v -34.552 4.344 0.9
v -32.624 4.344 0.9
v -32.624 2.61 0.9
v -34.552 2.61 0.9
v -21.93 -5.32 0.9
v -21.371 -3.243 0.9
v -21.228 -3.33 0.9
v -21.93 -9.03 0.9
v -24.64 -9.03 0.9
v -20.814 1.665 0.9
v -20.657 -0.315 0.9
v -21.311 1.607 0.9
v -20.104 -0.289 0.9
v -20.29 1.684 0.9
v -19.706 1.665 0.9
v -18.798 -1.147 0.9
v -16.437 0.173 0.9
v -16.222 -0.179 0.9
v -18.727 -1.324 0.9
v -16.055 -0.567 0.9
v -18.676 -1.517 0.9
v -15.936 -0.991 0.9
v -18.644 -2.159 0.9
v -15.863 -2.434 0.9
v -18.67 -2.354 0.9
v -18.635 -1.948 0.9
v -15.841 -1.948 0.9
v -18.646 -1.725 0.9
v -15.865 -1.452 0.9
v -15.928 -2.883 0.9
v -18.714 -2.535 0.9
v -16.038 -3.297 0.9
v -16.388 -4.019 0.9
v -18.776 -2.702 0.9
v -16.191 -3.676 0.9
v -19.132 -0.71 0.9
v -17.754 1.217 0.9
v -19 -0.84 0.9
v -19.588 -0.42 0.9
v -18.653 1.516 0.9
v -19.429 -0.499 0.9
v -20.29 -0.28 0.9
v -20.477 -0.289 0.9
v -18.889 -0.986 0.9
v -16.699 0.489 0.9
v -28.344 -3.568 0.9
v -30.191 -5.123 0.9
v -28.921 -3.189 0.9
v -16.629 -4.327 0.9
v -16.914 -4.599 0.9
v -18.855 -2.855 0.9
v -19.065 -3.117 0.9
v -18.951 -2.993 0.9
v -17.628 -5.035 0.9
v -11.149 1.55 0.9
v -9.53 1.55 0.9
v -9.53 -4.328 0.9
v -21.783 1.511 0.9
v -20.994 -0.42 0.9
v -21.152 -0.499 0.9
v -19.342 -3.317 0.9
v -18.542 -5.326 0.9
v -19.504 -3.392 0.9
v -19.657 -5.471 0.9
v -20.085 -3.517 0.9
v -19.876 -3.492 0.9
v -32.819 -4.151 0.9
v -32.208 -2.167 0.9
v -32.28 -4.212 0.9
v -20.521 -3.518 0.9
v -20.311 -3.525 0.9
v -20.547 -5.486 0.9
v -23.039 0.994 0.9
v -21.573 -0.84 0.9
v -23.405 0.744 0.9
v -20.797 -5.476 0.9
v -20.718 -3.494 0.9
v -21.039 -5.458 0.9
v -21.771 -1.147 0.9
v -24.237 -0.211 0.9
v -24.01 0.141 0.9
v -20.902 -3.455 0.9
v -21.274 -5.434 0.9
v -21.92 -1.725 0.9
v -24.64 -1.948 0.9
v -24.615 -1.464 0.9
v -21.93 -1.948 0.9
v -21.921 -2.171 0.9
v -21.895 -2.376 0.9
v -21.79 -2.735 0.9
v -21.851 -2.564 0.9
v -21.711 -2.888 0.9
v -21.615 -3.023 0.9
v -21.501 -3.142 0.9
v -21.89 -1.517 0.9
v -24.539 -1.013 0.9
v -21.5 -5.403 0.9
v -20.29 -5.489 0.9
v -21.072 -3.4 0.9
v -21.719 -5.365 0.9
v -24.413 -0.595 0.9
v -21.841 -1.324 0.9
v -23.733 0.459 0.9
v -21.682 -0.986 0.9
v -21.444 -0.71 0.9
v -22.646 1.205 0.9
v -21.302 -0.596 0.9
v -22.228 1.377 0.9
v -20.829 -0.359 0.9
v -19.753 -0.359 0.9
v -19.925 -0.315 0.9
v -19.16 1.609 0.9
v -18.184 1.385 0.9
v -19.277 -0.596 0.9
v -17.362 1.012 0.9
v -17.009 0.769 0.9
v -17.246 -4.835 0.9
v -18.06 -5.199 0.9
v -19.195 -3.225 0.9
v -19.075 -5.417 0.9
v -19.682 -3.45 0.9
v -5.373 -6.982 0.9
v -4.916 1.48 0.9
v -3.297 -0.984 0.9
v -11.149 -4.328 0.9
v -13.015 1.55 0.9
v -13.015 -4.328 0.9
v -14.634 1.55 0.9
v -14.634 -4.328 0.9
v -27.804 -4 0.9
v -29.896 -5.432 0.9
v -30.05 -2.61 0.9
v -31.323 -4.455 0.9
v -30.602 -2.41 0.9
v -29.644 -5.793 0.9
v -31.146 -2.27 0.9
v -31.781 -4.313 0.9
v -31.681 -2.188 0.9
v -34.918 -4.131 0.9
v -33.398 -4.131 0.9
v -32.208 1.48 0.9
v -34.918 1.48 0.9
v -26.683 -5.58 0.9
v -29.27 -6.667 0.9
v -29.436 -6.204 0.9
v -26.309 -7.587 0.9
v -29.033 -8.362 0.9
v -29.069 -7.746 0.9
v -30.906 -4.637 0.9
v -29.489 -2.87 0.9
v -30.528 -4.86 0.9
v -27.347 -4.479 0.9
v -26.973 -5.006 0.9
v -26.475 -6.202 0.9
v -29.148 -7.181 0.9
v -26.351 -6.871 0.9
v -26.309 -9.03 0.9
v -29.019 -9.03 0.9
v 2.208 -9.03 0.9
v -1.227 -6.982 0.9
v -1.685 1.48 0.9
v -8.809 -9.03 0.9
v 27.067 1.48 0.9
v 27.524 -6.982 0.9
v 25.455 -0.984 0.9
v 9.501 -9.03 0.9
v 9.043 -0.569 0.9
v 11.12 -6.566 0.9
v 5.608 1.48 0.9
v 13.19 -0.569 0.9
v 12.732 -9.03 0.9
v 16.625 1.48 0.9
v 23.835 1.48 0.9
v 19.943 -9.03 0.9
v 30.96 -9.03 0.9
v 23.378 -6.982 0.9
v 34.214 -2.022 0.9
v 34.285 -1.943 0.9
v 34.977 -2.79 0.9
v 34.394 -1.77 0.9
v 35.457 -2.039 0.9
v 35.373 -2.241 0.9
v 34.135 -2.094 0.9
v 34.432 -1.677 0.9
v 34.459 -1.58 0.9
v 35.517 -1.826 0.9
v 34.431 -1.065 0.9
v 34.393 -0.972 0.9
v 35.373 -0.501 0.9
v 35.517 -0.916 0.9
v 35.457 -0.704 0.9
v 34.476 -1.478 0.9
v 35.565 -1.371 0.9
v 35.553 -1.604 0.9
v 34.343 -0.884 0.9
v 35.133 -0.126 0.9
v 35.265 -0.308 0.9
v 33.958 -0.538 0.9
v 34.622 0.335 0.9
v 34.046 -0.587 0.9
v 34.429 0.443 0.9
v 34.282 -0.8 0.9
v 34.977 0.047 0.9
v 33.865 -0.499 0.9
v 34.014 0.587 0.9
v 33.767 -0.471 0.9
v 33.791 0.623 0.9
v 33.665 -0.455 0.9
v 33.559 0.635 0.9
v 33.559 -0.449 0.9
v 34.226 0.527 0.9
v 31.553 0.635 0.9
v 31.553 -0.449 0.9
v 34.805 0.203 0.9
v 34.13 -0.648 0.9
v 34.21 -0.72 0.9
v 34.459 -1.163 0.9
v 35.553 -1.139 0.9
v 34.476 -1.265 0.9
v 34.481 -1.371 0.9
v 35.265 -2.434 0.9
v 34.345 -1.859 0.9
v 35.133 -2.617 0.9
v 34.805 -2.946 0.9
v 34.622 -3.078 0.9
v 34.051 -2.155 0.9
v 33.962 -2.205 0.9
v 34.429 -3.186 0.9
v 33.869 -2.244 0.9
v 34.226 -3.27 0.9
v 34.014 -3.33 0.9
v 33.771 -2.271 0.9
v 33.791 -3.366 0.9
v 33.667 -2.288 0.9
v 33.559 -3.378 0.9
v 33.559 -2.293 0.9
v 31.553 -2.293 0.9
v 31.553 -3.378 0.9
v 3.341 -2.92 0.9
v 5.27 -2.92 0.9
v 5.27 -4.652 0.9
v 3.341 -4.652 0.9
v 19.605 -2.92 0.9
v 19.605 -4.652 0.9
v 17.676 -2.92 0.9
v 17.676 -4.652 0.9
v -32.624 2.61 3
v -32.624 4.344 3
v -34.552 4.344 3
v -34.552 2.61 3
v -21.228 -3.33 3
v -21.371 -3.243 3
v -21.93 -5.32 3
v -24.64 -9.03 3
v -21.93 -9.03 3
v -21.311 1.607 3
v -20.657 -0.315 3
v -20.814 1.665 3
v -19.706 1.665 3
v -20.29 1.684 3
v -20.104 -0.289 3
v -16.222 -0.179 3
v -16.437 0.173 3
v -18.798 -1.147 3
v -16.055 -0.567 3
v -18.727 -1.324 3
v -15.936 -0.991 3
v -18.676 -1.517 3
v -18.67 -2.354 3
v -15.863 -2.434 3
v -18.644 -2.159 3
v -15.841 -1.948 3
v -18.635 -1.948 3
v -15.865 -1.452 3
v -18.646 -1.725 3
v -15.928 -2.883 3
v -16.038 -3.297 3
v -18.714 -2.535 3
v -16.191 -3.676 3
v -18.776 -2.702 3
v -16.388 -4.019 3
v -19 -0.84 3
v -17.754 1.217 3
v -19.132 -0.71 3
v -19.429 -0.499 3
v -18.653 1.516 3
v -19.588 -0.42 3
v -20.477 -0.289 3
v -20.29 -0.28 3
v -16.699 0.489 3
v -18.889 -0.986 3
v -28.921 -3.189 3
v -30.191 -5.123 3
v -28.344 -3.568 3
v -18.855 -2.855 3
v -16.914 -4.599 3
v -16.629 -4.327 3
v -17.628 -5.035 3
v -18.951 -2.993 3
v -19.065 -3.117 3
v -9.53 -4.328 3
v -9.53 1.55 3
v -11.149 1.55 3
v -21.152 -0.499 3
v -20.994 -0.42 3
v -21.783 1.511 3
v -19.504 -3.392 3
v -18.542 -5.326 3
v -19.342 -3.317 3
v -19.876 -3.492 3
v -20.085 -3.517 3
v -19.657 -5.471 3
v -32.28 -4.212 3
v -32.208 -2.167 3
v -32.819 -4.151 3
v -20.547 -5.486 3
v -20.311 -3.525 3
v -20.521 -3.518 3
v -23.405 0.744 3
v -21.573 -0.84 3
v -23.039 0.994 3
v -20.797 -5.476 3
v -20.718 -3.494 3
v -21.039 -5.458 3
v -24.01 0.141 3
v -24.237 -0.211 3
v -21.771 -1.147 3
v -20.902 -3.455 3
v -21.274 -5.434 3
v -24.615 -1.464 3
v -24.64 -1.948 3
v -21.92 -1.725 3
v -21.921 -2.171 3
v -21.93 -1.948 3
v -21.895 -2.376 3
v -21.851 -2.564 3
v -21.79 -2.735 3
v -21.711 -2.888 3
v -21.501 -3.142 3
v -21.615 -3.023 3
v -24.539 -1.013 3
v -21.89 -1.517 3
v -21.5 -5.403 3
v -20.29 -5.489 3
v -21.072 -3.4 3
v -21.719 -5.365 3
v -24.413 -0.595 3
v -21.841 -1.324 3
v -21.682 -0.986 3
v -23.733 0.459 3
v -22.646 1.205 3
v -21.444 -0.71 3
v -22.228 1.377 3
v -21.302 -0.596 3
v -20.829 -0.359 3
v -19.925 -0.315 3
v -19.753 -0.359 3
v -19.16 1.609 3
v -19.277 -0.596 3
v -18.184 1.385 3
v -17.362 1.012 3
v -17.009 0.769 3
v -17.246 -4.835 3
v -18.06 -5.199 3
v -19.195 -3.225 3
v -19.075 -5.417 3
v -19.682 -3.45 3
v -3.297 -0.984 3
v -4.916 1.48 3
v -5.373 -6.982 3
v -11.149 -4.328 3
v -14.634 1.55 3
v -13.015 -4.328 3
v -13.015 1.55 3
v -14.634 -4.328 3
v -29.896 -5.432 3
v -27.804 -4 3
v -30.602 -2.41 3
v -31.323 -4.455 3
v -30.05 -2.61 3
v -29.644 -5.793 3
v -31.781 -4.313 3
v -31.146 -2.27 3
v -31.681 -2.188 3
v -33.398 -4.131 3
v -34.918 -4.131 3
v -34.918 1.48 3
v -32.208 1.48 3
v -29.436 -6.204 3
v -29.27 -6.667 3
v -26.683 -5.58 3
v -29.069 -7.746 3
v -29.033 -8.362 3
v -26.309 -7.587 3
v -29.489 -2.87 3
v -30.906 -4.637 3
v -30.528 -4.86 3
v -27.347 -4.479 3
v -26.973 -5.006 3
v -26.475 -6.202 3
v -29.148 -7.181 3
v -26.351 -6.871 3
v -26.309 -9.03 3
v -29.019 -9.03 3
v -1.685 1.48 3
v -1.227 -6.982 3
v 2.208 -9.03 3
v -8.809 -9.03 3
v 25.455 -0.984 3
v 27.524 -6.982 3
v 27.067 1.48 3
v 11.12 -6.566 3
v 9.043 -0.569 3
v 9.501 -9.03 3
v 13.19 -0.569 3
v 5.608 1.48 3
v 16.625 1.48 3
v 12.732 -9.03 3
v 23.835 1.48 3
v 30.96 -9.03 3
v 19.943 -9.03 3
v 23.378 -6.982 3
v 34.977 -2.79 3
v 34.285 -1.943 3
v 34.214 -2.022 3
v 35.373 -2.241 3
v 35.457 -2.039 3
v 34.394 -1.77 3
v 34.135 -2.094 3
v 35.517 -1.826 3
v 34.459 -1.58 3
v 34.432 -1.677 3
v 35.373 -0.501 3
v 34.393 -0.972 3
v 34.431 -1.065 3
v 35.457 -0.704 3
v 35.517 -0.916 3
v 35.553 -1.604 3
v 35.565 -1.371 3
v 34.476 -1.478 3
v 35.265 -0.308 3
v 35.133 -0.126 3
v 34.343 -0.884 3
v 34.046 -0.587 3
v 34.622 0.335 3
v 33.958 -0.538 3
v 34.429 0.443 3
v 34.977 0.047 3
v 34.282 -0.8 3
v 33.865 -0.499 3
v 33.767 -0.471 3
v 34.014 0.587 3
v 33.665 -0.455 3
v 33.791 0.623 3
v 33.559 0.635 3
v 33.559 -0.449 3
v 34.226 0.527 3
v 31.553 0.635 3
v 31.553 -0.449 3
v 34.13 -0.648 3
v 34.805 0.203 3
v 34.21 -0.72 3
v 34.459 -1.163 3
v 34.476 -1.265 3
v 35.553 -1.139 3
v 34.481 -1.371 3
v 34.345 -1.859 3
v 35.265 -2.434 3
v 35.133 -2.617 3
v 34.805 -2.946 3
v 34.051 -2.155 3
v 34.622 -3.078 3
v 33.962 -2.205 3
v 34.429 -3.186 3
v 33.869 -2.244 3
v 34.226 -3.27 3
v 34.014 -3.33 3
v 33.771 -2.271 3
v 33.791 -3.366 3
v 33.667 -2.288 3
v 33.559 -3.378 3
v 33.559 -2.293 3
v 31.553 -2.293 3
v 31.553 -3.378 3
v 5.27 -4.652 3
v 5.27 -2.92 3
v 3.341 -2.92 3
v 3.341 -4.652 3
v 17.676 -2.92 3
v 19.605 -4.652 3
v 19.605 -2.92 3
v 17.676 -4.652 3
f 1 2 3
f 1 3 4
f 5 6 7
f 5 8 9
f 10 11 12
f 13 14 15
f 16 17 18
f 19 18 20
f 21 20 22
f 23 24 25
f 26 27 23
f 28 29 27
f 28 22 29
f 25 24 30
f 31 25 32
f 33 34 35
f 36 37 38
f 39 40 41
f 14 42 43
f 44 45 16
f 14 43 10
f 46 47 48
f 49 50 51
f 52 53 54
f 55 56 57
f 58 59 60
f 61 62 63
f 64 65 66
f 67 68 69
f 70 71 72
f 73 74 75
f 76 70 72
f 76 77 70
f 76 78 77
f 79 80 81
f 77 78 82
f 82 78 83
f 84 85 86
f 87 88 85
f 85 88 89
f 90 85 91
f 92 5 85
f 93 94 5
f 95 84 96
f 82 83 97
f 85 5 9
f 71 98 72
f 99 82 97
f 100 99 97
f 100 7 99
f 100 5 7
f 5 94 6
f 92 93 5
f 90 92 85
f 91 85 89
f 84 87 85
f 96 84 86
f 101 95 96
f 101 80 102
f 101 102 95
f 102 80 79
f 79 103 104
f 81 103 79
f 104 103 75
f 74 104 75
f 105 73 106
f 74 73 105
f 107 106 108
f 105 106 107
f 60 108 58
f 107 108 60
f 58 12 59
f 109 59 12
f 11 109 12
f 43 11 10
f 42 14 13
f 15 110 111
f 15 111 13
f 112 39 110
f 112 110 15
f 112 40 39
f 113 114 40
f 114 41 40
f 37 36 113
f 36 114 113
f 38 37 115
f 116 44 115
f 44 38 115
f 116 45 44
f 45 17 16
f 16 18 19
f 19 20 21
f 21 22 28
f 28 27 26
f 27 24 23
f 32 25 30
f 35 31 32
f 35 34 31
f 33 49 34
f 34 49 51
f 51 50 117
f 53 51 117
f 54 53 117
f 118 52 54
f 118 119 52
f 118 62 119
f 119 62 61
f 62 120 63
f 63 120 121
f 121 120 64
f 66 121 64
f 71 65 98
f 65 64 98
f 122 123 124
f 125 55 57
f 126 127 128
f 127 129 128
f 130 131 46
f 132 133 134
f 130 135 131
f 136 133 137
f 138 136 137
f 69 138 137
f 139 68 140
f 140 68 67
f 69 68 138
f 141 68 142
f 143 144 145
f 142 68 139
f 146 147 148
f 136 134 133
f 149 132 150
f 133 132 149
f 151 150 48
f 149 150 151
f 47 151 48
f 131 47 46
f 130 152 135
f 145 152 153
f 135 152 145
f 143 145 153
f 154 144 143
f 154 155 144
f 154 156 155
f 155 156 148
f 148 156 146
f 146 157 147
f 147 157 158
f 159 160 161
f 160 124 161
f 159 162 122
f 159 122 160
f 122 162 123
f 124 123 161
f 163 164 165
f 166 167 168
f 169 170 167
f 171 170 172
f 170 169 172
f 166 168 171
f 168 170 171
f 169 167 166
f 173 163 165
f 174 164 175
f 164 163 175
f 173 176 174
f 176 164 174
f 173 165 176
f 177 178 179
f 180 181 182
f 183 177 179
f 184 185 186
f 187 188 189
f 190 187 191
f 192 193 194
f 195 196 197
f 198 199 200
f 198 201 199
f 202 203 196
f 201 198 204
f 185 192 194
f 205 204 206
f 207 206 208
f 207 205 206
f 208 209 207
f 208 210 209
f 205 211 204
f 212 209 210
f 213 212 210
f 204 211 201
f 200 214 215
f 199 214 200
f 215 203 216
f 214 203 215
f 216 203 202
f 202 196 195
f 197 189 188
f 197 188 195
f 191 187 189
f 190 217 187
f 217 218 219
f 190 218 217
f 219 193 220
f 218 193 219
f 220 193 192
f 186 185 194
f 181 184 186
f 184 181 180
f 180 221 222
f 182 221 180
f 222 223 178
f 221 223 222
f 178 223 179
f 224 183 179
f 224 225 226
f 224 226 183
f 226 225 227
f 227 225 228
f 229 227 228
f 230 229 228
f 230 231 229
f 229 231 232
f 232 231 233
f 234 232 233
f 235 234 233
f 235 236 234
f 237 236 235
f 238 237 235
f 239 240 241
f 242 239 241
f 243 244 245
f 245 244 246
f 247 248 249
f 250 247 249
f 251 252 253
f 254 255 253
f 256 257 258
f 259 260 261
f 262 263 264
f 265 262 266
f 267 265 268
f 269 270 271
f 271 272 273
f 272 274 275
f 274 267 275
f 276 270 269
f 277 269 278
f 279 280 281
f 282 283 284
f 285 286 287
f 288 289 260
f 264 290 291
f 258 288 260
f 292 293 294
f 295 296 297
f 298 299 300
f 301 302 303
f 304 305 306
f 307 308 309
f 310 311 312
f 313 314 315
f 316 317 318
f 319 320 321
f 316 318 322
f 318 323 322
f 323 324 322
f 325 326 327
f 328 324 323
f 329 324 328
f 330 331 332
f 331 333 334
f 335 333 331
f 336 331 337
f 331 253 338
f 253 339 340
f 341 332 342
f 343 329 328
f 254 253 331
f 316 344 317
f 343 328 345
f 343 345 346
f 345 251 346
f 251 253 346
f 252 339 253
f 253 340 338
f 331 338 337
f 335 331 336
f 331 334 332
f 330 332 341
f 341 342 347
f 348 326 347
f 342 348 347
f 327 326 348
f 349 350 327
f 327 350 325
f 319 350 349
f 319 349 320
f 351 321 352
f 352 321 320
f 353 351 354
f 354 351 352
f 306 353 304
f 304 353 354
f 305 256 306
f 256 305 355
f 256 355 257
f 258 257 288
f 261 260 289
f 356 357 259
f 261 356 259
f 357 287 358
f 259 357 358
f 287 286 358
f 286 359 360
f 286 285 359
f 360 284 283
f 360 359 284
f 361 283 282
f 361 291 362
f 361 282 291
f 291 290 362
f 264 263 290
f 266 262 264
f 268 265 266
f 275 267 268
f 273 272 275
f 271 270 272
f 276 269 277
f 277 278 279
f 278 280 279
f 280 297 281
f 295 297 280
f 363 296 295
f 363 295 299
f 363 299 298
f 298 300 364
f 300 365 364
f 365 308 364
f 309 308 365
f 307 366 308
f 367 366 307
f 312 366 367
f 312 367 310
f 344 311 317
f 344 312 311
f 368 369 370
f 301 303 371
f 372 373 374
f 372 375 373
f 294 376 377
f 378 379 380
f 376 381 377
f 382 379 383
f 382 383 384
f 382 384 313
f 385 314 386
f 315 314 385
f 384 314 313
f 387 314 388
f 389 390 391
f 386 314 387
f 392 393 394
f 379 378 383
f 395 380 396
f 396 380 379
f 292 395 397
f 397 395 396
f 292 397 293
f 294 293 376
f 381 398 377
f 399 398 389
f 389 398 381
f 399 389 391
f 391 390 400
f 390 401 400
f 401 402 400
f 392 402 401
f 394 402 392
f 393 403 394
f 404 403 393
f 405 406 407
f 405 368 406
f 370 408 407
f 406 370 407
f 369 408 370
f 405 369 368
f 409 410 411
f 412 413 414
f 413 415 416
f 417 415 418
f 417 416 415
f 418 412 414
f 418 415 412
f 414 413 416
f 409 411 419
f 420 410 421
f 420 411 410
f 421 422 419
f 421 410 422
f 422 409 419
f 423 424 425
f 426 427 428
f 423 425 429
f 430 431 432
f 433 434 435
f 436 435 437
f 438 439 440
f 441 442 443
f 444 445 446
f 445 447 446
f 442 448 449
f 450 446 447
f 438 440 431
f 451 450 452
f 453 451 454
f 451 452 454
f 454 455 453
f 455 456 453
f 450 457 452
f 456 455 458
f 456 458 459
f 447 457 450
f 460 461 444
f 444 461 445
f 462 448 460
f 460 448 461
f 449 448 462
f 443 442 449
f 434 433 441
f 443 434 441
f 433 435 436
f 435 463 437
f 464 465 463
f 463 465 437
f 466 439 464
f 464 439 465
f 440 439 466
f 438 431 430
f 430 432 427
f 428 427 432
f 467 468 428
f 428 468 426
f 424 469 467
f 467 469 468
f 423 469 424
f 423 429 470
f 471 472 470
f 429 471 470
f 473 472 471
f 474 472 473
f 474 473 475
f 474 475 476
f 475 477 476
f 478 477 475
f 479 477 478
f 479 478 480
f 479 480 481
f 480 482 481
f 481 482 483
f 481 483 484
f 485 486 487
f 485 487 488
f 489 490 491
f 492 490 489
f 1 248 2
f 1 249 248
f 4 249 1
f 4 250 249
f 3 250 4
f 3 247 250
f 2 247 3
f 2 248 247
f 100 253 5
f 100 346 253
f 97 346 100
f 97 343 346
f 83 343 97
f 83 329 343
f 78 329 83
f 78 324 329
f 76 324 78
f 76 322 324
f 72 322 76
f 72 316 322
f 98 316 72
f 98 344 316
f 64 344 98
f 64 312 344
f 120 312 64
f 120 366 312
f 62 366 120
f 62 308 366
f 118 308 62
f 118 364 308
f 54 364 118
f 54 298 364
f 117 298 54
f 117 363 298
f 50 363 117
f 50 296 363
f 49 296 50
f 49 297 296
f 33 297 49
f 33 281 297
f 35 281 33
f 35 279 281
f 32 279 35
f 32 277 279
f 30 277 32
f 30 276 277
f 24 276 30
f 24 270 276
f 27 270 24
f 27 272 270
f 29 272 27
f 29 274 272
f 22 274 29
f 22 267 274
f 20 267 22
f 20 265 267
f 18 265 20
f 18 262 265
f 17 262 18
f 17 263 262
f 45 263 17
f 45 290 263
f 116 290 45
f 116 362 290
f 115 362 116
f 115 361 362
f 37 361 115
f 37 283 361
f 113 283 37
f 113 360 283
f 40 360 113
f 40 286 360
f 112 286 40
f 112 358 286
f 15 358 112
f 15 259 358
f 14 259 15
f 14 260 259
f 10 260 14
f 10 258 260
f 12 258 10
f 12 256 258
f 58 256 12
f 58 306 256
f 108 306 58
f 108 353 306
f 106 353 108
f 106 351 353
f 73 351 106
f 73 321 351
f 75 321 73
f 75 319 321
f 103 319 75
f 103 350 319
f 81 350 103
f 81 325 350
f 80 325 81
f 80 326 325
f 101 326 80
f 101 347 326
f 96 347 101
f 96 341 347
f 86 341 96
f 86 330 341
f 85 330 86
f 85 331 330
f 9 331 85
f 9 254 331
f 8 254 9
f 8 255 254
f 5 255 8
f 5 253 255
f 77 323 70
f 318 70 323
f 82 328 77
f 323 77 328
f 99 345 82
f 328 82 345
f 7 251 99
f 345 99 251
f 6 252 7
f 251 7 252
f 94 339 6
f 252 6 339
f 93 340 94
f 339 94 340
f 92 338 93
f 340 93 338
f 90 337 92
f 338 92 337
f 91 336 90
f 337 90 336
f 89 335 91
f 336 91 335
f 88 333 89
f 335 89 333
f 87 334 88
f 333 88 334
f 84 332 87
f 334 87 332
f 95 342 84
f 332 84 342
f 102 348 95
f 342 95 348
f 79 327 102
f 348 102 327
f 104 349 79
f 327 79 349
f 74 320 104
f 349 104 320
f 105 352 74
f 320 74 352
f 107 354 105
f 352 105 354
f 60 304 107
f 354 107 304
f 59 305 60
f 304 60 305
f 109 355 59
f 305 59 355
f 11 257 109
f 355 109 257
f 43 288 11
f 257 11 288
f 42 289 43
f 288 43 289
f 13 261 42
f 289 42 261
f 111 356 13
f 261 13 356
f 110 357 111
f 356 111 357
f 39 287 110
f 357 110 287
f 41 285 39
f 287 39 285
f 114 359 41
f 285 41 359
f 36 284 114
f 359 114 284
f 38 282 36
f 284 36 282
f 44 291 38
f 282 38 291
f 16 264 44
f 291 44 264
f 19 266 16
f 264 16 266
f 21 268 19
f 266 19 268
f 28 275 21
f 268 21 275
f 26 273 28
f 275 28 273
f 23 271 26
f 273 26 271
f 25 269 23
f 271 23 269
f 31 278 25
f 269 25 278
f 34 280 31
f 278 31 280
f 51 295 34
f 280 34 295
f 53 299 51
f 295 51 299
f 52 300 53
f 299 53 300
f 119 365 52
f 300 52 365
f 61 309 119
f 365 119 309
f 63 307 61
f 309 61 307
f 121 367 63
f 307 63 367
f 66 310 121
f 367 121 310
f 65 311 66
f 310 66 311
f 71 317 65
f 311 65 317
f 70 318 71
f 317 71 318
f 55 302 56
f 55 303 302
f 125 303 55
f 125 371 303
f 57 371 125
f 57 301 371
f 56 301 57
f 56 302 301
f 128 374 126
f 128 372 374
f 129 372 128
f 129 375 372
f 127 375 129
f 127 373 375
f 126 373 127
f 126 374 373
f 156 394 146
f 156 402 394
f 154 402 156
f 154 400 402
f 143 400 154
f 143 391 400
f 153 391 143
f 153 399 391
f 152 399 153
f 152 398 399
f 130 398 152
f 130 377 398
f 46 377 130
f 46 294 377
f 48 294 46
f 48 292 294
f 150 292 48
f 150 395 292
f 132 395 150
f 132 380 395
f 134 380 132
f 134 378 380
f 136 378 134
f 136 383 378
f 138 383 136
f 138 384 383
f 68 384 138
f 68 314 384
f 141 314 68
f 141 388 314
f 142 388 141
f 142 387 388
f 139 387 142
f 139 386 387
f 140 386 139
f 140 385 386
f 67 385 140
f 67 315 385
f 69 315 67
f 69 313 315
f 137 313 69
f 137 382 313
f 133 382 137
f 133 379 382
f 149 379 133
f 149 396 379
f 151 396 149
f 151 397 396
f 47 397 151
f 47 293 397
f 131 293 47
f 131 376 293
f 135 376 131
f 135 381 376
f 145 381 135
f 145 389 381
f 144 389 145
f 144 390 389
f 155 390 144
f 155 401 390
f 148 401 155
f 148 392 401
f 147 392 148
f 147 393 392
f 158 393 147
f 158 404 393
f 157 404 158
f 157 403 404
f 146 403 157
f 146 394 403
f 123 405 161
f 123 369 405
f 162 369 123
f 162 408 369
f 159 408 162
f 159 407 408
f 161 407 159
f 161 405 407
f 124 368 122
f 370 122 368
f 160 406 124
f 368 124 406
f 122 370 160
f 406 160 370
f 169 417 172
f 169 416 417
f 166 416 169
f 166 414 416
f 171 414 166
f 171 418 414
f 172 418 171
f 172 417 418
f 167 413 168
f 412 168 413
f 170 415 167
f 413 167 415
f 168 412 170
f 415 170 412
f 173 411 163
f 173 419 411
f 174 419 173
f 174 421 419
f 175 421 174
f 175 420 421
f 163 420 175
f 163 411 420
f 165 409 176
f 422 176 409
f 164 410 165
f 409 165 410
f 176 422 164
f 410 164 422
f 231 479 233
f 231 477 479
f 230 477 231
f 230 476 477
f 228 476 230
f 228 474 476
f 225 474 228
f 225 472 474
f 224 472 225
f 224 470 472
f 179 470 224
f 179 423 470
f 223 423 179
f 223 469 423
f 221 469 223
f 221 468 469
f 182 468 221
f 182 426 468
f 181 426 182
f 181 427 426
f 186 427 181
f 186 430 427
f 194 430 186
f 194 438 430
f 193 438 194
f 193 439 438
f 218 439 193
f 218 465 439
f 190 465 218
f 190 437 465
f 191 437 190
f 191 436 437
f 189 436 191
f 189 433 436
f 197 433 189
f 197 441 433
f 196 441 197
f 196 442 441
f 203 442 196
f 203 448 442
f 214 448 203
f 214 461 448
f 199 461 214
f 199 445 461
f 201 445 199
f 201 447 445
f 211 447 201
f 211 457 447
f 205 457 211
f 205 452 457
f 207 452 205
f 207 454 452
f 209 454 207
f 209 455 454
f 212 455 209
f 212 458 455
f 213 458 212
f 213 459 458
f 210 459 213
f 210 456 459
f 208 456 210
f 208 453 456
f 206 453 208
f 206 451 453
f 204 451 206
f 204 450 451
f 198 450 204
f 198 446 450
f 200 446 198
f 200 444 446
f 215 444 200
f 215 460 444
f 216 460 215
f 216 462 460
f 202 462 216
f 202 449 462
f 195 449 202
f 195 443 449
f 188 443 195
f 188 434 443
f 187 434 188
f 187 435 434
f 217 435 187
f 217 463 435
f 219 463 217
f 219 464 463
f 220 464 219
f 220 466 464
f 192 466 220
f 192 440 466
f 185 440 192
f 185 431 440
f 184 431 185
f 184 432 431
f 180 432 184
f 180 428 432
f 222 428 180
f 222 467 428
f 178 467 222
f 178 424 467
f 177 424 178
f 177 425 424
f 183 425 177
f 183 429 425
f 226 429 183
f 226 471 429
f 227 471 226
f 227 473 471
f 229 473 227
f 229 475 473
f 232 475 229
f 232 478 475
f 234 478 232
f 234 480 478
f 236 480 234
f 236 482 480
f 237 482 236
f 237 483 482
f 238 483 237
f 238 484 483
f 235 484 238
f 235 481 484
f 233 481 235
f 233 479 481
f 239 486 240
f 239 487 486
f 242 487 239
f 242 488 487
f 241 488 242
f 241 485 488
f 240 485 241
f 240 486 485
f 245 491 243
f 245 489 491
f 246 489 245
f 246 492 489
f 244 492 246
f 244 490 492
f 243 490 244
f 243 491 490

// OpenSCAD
$fn = 48;
  // syllabics (overlaid on icon, tallest)
  translate([0, -2.500, 0.900]) linear_extrude(height=2.100) text("ᓵᑭᐦᐃᐌᐎᐣ", size=10.381, halign="center", valign="center", font="Euphemia UCAS:style=Bold");
